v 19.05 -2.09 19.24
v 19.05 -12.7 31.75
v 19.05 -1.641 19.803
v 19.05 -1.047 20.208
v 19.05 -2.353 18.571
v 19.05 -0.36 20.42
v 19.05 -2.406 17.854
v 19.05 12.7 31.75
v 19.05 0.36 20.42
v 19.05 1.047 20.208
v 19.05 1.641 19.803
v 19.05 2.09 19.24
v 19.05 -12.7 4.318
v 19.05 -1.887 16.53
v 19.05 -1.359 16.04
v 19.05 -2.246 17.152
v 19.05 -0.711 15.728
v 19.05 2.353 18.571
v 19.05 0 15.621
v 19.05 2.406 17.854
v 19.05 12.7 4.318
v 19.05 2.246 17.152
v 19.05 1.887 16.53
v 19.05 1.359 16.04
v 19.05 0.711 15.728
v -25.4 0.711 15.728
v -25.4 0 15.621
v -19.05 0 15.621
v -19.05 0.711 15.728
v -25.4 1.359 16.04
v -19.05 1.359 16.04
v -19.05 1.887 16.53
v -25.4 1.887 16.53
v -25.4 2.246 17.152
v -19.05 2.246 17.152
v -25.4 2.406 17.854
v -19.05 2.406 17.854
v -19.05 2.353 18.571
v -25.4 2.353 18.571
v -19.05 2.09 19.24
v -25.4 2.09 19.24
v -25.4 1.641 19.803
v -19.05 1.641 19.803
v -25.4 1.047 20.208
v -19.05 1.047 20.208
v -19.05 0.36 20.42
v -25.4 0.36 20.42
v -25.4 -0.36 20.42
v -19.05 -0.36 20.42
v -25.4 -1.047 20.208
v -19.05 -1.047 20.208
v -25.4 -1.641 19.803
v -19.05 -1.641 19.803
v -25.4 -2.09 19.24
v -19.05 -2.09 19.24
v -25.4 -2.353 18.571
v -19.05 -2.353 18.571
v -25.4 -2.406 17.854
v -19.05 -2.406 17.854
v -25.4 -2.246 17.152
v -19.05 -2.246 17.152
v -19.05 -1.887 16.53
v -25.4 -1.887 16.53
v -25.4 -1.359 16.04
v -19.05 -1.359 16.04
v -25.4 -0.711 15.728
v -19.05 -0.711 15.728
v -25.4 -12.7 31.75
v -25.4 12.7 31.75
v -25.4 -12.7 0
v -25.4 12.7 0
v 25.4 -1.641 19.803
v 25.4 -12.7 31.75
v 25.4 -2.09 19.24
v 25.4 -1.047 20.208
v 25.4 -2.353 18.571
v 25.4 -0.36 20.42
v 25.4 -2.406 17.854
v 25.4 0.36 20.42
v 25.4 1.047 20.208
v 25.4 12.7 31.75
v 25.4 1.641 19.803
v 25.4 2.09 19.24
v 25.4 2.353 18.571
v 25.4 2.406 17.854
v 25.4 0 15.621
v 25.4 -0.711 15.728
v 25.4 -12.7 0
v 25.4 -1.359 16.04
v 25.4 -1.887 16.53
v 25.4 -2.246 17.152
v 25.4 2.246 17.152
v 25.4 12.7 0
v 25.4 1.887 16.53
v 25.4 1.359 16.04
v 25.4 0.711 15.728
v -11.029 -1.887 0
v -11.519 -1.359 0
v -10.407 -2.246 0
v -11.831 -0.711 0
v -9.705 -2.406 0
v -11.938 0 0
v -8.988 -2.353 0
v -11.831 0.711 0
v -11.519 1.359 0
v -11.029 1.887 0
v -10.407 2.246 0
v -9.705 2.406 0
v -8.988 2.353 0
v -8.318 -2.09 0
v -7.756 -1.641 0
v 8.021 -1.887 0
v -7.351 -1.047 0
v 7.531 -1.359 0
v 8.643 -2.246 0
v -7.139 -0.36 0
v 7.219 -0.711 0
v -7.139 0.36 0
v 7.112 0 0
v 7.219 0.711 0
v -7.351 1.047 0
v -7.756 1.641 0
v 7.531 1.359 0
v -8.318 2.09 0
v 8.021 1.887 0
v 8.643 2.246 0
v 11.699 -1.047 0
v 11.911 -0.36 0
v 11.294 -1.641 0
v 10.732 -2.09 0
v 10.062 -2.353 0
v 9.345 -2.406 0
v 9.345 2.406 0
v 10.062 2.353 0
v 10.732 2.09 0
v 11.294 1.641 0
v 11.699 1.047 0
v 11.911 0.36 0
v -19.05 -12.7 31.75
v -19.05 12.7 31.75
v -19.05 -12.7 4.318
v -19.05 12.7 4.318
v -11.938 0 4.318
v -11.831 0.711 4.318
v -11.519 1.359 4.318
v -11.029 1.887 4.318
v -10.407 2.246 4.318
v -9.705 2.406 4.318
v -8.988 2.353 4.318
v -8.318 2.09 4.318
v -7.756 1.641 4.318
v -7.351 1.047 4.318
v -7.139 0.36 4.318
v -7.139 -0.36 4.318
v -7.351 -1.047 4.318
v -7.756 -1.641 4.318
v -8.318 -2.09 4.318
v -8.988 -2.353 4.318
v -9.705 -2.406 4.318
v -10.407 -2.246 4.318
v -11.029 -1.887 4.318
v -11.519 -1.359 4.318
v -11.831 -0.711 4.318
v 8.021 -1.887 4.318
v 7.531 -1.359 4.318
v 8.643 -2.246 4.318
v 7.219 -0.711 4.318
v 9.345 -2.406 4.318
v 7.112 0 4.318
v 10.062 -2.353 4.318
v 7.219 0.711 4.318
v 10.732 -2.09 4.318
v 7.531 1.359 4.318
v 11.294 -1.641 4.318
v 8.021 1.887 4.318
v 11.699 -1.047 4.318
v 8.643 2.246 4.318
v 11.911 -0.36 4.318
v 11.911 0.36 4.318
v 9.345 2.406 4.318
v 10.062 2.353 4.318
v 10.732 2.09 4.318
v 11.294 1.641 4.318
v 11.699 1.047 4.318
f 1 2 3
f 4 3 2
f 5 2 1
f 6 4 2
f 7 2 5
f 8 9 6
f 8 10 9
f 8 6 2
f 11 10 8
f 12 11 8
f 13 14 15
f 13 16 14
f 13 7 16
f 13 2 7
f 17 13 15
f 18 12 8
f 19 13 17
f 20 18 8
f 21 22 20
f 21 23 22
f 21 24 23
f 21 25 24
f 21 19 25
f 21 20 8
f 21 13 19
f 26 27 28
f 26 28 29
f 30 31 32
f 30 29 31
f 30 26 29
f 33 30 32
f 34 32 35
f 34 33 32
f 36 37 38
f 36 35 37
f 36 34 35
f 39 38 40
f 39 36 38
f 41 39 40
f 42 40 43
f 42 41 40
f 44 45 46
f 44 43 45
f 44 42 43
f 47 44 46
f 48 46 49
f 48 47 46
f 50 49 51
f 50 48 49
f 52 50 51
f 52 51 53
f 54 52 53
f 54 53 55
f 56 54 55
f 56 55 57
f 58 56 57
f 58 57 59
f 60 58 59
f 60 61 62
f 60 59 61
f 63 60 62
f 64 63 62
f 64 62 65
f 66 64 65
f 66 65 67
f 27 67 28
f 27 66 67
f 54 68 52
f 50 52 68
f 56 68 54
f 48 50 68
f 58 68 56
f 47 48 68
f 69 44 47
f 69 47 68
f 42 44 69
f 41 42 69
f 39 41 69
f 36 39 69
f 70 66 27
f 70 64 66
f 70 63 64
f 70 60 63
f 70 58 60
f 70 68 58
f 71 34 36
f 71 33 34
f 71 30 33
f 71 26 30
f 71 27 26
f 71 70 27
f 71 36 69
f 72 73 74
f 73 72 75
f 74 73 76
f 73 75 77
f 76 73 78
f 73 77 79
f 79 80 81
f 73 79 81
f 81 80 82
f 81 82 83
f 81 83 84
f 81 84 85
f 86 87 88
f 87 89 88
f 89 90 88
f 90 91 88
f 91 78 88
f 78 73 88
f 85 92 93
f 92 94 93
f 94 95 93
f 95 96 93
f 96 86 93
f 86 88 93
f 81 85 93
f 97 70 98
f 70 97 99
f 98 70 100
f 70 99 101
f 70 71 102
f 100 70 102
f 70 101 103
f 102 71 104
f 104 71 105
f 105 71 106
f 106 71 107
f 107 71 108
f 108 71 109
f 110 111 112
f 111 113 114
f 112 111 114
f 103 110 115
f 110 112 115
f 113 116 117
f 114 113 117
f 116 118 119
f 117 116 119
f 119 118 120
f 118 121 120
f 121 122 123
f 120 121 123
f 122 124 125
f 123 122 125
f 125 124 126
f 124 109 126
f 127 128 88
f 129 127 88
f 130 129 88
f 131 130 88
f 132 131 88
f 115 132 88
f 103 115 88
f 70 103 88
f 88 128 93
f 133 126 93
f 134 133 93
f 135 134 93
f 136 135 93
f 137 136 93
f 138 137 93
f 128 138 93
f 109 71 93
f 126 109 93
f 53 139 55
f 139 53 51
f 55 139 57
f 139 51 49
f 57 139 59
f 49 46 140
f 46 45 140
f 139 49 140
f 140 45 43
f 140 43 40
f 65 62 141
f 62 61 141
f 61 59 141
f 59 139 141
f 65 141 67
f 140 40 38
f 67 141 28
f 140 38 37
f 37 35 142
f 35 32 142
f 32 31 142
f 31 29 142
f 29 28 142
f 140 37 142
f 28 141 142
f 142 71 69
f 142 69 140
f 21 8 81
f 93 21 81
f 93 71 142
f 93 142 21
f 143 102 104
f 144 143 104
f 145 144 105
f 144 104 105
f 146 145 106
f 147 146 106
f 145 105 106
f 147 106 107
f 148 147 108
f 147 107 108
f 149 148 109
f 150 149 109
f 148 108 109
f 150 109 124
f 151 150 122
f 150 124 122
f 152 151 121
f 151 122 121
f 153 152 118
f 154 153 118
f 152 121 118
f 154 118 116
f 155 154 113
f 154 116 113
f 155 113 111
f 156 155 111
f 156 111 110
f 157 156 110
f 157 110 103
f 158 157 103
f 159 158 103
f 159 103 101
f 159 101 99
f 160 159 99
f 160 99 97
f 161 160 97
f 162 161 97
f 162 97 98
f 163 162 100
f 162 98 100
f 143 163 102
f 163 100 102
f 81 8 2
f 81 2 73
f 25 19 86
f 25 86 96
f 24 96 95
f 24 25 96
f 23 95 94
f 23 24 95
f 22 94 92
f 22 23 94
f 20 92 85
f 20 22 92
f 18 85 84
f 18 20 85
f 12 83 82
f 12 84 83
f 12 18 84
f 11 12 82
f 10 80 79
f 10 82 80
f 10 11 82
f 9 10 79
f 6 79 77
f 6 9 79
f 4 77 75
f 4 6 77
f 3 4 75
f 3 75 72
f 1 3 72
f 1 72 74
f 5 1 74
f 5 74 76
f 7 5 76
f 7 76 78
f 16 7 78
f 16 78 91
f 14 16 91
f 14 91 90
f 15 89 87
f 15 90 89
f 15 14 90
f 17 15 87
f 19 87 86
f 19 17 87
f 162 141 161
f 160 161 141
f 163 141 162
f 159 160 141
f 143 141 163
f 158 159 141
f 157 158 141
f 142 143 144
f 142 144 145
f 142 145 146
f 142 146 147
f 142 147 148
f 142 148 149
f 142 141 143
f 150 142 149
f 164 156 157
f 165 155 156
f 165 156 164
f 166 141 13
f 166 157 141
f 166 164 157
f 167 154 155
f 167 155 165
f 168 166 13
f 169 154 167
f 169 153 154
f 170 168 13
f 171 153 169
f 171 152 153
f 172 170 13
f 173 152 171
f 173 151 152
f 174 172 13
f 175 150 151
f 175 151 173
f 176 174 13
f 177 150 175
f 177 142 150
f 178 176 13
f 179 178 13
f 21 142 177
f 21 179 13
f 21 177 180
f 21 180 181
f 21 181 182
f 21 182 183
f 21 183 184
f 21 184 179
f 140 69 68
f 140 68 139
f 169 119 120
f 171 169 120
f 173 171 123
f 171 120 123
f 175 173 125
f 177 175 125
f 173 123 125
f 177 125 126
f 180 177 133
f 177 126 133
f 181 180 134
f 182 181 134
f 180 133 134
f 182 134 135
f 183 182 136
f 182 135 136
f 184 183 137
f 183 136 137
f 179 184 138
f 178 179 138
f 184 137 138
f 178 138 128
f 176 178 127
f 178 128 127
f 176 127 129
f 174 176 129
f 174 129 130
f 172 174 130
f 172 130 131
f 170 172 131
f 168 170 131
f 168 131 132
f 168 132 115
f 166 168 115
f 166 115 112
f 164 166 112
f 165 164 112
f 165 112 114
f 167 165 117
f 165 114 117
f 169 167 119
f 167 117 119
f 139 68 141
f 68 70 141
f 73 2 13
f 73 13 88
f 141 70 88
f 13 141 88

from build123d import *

# Parameters (mm, degrees)
SKETCH1_W               = 50.8
SKETCH1_H               = 25.4
BOSS_EXTRUDE1_DEPTH     = 4.318
SKETCH2_W               = 6.35
SKETCH2_H               = 25.4
BOSS_EXTRUDE2_DEPTH     = 27.432
SKETCH4_R               = 2.413
CUT_EXTRUDE1_DEPTH      = 4.318
CUT_EXTRUDE2_DEPTH      = 57.081681501
CUT_EXTRUDE2_DEPTH_BACK = 57.081681501
SKETCH5_R               = 2.413


with BuildPart() as part:
    # Sketch1 → Boss-Extrude1 (new body)
    with BuildSketch(Plane.XY):
        Rectangle(SKETCH1_W, SKETCH1_H)
    extrude(amount=BOSS_EXTRUDE1_DEPTH)

    # Sketch2 → Boss-Extrude2 (add)
    with BuildSketch(Plane.XY.offset(4.318)):
        with Locations((-22.225, 0)):
            Rectangle(SKETCH2_W, SKETCH2_H)
        with Locations((22.225, 0)):
            Rectangle(SKETCH2_W, SKETCH2_H)
    extrude(amount=BOSS_EXTRUDE2_DEPTH)

    # Sketch4 → Cut-Extrude1 (cut)
    with BuildSketch(Plane(origin=(0, 0, 0), x_dir=(-1, 0, 0), z_dir=(0, 0, -1))):
        with Locations((-9.525, 0)):
            Circle(SKETCH4_R)
        with Locations((9.525, 0)):
            Circle(SKETCH4_R)
    extrude(amount=-CUT_EXTRUDE1_DEPTH, mode=Mode.SUBTRACT)

    # Sketch5 → Cut-Extrude2 (cut, two sides: drawn at the far end of the back side and taken through both)
    with BuildSketch(Plane(origin=(-19.05, 0, 0), x_dir=(0, 0, -1), z_dir=(1, 0, 0)).offset(-CUT_EXTRUDE2_DEPTH_BACK)):
        with Locations((-18.034, 0)):
            Circle(SKETCH5_R)
    extrude(amount=CUT_EXTRUDE2_DEPTH + CUT_EXTRUDE2_DEPTH_BACK, mode=Mode.SUBTRACT)


solid = part.part
